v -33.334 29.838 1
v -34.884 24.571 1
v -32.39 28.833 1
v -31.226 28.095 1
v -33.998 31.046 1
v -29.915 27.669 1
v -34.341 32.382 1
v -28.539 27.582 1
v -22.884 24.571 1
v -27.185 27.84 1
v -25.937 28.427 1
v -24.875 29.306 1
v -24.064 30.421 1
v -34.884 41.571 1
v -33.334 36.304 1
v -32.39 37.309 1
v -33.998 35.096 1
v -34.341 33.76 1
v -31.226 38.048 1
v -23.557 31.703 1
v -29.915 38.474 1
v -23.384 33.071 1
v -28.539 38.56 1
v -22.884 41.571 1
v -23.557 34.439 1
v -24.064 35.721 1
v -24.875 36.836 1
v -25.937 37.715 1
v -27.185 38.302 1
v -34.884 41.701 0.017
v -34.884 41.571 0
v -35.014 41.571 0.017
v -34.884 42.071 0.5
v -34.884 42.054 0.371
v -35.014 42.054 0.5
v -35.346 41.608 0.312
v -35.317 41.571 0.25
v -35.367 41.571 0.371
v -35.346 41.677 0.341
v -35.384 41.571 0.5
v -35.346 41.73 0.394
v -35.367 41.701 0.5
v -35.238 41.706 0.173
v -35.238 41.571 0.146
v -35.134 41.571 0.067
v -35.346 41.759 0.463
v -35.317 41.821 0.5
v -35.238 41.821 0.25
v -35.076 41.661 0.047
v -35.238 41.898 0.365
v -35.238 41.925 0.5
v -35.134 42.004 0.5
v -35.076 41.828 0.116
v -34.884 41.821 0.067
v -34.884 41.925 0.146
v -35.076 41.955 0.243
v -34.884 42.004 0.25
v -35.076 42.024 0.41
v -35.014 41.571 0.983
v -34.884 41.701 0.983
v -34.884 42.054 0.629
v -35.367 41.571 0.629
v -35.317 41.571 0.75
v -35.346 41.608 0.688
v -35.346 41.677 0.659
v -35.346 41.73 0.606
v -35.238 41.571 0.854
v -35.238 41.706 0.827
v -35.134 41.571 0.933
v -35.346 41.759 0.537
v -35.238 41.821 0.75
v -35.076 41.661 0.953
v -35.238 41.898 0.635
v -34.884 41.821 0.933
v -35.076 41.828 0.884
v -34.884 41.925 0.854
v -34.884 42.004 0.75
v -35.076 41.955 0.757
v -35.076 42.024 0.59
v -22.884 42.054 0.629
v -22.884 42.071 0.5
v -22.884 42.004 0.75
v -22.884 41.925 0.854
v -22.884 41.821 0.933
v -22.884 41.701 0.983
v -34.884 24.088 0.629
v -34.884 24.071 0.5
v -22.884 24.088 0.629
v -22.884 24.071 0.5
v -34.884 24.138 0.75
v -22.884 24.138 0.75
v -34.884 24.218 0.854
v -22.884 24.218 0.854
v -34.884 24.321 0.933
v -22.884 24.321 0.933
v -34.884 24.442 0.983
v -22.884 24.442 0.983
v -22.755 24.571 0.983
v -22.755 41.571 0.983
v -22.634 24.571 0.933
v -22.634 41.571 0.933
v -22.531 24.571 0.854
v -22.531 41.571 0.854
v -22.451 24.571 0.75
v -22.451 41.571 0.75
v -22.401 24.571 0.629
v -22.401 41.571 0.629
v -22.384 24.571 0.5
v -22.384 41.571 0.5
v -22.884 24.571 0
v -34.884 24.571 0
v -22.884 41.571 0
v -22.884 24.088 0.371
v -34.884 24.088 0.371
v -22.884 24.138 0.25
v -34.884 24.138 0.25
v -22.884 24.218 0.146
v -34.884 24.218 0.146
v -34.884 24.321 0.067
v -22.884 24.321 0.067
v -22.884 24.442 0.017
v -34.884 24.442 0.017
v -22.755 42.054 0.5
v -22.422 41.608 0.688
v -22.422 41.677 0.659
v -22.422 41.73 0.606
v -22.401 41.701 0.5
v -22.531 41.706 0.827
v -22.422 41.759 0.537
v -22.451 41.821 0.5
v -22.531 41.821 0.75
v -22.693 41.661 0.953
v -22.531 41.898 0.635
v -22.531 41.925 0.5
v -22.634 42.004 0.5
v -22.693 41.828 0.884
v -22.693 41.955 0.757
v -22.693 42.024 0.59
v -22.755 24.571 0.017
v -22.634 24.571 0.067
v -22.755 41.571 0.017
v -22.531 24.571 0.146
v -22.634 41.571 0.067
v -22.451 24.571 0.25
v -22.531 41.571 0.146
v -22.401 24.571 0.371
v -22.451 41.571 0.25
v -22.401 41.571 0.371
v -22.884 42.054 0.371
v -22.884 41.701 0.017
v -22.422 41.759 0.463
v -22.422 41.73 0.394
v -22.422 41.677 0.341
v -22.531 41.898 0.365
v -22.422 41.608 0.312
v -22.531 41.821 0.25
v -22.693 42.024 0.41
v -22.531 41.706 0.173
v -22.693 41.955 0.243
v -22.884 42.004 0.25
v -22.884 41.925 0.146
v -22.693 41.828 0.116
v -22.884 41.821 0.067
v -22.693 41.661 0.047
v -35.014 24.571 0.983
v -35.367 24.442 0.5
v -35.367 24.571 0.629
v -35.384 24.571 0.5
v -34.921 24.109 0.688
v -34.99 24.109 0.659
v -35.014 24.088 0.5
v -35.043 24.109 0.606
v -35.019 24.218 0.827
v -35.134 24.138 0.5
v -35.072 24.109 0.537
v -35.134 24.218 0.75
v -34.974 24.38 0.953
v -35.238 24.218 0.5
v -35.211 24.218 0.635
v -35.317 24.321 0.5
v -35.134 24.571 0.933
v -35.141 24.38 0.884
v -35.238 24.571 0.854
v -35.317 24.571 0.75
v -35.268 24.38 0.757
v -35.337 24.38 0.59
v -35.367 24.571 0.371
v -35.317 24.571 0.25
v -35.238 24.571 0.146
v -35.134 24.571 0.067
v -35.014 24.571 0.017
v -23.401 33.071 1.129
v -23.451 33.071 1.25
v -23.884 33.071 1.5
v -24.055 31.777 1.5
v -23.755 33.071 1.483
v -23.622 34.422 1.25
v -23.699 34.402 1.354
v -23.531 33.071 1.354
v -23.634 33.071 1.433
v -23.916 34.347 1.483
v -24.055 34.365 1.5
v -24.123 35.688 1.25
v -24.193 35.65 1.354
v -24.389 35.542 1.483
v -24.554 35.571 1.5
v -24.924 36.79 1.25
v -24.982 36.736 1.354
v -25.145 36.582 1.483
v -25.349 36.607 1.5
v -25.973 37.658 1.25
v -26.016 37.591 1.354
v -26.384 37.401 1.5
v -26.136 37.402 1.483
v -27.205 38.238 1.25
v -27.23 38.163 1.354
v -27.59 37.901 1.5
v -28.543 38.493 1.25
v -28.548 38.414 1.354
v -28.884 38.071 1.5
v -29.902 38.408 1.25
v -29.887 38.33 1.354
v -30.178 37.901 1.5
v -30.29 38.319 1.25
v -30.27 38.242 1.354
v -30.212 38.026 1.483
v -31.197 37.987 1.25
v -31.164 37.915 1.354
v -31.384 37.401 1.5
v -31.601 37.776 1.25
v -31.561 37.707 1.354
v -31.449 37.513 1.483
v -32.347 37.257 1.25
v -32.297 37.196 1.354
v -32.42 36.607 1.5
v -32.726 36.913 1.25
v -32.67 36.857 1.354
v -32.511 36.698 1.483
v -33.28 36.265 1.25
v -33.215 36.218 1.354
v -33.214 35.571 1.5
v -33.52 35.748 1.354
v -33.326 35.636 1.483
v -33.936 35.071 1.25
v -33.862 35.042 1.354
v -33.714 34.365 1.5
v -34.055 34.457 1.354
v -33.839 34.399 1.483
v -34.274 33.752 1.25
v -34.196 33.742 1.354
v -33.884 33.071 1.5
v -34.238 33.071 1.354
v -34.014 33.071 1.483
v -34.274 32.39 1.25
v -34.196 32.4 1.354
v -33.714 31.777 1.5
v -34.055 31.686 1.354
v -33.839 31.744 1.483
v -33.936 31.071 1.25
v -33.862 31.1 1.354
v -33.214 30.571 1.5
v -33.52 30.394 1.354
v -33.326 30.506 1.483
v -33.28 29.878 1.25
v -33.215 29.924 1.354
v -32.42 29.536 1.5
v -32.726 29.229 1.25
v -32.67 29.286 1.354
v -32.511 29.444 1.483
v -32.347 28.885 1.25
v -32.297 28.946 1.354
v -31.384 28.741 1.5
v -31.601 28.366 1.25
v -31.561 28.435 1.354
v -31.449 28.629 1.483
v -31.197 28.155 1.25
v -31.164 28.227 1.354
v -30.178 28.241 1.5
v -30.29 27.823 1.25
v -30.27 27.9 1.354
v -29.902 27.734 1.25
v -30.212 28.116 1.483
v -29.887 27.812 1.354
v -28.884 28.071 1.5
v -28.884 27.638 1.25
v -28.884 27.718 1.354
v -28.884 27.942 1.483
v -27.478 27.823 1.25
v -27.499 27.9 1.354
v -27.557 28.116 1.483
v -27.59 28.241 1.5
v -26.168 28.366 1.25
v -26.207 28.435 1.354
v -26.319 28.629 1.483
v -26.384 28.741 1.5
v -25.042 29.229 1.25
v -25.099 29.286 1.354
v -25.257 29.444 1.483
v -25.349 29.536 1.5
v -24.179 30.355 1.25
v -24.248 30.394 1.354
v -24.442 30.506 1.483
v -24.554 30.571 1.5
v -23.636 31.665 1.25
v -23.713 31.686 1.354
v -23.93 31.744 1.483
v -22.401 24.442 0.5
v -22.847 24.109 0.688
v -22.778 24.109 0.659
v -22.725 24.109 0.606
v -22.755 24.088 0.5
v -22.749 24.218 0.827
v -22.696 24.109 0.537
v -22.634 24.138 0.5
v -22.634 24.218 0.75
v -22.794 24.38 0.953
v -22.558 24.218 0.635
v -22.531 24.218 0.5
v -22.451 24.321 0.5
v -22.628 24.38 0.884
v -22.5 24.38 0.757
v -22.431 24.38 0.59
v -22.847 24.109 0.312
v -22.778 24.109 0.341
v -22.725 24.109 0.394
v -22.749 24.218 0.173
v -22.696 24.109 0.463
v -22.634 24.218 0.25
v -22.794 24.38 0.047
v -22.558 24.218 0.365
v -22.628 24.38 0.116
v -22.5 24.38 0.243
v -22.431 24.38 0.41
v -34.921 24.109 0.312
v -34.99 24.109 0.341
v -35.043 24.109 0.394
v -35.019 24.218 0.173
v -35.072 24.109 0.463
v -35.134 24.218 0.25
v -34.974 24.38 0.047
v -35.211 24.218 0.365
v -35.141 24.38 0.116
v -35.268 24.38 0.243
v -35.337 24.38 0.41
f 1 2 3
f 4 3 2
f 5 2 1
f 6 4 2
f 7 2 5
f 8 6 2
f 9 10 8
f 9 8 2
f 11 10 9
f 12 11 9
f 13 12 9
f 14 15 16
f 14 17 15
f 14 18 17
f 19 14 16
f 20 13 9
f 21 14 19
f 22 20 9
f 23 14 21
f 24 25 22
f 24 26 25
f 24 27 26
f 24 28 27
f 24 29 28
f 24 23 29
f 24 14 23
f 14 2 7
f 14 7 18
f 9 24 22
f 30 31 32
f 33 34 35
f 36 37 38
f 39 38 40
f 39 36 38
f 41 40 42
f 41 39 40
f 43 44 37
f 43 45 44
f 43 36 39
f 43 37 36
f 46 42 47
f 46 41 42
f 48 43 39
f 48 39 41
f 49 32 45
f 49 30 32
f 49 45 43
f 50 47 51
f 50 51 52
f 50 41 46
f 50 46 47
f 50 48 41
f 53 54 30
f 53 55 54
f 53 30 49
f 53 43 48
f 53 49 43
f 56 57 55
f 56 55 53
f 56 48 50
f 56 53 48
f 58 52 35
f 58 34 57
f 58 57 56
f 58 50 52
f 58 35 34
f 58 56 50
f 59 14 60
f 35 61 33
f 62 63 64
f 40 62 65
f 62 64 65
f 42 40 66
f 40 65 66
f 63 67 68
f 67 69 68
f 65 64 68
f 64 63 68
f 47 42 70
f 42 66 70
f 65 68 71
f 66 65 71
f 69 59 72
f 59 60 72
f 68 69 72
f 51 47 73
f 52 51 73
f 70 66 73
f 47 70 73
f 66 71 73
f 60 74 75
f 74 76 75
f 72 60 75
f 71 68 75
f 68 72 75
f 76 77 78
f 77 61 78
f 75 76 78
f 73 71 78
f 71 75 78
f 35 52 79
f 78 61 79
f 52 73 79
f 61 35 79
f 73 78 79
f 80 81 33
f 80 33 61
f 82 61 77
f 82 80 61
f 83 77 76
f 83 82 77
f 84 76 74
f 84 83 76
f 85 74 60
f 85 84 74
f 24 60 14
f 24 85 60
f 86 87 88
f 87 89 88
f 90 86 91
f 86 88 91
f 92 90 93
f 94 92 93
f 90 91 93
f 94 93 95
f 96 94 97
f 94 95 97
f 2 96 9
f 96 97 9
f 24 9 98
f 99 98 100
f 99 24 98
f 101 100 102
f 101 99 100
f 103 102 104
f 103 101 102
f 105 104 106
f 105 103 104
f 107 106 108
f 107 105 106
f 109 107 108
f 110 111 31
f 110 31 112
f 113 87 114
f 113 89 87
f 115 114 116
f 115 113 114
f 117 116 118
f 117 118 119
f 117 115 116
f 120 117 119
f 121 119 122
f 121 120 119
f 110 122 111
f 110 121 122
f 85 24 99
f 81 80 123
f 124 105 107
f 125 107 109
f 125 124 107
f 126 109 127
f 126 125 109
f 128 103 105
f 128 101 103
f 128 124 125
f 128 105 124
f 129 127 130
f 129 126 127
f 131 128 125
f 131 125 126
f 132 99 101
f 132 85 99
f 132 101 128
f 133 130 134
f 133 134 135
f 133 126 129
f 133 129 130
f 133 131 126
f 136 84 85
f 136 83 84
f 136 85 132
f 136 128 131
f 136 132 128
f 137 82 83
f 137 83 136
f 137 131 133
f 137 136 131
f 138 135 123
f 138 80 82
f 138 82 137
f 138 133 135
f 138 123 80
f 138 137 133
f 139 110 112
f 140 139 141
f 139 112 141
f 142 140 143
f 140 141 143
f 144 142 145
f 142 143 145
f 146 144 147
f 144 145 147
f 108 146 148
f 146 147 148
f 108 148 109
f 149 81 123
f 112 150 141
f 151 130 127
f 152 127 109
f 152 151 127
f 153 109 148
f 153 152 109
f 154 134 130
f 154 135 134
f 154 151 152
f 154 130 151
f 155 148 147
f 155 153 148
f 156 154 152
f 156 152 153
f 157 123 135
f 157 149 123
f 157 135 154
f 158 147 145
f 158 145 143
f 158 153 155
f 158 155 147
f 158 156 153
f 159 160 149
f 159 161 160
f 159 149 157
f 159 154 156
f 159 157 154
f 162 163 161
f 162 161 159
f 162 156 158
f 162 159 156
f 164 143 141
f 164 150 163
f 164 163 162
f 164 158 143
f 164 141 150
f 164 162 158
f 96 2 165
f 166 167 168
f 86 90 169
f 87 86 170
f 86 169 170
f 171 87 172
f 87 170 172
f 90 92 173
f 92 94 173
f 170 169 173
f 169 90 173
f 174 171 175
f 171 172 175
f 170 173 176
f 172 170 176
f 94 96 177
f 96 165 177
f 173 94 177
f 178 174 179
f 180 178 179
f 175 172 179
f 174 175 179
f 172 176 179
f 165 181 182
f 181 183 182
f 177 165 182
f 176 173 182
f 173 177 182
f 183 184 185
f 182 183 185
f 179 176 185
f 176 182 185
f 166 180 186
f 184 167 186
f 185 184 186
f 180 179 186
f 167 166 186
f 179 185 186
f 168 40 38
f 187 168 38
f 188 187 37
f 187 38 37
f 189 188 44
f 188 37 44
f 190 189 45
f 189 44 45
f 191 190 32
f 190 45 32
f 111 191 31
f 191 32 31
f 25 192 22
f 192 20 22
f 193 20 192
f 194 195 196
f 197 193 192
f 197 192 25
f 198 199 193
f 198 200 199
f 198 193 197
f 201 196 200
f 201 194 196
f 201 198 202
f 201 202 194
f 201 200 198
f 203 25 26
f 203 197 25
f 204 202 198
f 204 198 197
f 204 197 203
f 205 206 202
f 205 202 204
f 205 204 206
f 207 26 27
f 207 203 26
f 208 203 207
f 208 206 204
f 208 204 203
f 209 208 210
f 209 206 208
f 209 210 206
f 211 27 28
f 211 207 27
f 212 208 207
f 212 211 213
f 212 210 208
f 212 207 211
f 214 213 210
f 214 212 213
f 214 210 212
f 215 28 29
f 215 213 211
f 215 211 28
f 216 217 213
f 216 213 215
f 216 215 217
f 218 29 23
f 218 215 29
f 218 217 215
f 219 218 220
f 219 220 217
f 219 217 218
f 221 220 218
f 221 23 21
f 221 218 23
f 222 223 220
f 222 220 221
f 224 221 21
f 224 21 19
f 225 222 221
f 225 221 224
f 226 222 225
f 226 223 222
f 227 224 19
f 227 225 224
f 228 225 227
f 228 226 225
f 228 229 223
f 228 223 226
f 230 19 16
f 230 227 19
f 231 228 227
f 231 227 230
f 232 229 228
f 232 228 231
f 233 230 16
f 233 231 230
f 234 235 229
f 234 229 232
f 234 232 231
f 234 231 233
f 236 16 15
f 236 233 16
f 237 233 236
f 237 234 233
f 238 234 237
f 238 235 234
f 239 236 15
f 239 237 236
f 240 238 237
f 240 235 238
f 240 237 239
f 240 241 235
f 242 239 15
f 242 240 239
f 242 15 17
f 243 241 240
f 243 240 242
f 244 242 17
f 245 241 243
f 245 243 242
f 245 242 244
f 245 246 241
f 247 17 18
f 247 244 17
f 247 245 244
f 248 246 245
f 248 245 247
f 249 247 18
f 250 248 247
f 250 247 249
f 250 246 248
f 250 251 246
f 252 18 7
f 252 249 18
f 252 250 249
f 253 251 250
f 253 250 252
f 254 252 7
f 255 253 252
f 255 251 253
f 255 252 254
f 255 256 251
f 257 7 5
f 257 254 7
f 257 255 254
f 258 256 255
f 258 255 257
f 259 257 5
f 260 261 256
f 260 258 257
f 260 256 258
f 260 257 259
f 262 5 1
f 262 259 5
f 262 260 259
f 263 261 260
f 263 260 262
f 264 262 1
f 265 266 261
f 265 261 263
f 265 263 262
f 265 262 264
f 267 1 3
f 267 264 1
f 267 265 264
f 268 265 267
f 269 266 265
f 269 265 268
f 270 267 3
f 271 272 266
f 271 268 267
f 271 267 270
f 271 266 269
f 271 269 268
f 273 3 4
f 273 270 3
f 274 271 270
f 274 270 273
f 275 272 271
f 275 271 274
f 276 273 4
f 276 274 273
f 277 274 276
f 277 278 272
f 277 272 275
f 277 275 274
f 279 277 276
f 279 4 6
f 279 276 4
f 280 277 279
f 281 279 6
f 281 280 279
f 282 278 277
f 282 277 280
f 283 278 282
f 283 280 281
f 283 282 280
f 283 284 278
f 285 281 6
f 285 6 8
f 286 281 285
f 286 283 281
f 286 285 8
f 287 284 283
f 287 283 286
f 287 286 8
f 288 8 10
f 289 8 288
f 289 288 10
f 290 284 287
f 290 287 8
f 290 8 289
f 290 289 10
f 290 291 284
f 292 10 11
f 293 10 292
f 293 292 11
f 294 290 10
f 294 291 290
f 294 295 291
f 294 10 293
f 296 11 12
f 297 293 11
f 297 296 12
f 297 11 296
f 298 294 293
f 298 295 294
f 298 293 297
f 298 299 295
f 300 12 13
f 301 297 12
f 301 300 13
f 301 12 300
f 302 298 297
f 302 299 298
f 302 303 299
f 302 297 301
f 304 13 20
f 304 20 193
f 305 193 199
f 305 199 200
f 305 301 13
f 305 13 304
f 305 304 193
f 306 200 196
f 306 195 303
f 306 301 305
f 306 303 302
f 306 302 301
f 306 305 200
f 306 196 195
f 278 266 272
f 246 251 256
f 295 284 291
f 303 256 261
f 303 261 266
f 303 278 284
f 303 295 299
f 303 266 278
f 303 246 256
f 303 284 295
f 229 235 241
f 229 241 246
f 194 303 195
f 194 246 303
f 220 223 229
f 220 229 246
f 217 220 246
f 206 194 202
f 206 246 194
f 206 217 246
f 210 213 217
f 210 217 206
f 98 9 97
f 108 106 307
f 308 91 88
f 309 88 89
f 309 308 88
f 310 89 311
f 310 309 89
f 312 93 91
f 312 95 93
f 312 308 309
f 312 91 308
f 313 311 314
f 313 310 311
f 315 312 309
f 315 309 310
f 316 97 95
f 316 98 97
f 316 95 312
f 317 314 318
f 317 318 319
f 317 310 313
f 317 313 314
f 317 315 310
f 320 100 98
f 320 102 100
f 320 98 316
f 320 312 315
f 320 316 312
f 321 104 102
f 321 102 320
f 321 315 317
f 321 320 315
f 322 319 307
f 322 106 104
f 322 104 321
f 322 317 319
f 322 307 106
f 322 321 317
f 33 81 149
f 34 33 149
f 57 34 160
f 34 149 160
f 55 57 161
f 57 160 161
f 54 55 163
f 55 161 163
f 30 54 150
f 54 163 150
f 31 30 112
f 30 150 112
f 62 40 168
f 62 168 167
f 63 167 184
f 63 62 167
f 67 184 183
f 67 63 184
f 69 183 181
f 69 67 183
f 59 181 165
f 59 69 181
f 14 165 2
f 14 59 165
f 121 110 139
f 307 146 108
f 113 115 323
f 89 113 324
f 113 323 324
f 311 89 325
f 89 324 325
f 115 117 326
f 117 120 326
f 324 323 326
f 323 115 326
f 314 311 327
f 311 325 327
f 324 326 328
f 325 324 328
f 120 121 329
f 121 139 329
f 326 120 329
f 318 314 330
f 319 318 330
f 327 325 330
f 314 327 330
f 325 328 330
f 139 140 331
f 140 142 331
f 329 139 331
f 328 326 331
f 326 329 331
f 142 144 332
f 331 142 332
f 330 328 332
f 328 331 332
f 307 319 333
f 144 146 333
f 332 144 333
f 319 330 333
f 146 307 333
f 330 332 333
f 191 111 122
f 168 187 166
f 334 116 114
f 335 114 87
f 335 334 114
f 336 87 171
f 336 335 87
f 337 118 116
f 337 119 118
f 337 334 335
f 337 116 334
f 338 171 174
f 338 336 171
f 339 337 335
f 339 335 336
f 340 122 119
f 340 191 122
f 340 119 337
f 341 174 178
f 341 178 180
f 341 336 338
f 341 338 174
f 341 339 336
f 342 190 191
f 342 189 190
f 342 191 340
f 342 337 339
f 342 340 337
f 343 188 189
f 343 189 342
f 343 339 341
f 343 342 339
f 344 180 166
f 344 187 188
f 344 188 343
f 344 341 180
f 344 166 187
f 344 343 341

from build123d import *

# Parameters (mm, degrees)
F0_W     = 13
F0_H     = 18
F1_DEPTH = 1
F2_R     = 5.5
F3_DEPTH = 0.5
F4_R     = 0.49999


# Not quite as in the source:
# - a fillet or chamfer is up to 0.001 mm smaller than in the source, because OpenCascade refuses the exact size


with BuildPart() as f1:
    # F0 (on Top) → F1 (new body)
    with BuildSketch(Plane.XY):
        with Locations((-28.8841596369, 33.0711239949)):
            Rectangle(F0_W, F0_H)
    extrude(amount=F1_DEPTH)

    # F2 (on face) → F3 (join)
    with BuildSketch(Plane.XY.offset(1)):
        with Locations((-28.8841596369, 33.0711239949)):
            Circle(F2_R)
    extrude(amount=F3_DEPTH)

    # F4 (radius 0.5 in the source; OpenCascade refuses exactly that, so slightly less here)
    f4_edges = [f1.edges().sort_by_distance(p)[0] for p in [
        (-28.88416, 42.071124, 1),
        (-28.88416, 42.071124, 0),
        (-35.38416, 33.071124, 1),
        (-22.38416, 33.071124, 1),
        (-28.88416, 24.071124, 1),
        (-34.38416, 33.071124, 1.5),
        (-22.38416, 42.071124, 0.5),
        (-22.38416, 33.071124, 0),
        (-35.38416, 33.071124, 0),
        (-28.88416, 24.071124, 0),
        (-22.38416, 24.071124, 0.5),
        (-35.38416, 24.071124, 0.5),
        (-35.38416, 42.071124, 0.5),
    ]]
    fillet(f4_edges, radius=F4_R)


solid = f1.part
